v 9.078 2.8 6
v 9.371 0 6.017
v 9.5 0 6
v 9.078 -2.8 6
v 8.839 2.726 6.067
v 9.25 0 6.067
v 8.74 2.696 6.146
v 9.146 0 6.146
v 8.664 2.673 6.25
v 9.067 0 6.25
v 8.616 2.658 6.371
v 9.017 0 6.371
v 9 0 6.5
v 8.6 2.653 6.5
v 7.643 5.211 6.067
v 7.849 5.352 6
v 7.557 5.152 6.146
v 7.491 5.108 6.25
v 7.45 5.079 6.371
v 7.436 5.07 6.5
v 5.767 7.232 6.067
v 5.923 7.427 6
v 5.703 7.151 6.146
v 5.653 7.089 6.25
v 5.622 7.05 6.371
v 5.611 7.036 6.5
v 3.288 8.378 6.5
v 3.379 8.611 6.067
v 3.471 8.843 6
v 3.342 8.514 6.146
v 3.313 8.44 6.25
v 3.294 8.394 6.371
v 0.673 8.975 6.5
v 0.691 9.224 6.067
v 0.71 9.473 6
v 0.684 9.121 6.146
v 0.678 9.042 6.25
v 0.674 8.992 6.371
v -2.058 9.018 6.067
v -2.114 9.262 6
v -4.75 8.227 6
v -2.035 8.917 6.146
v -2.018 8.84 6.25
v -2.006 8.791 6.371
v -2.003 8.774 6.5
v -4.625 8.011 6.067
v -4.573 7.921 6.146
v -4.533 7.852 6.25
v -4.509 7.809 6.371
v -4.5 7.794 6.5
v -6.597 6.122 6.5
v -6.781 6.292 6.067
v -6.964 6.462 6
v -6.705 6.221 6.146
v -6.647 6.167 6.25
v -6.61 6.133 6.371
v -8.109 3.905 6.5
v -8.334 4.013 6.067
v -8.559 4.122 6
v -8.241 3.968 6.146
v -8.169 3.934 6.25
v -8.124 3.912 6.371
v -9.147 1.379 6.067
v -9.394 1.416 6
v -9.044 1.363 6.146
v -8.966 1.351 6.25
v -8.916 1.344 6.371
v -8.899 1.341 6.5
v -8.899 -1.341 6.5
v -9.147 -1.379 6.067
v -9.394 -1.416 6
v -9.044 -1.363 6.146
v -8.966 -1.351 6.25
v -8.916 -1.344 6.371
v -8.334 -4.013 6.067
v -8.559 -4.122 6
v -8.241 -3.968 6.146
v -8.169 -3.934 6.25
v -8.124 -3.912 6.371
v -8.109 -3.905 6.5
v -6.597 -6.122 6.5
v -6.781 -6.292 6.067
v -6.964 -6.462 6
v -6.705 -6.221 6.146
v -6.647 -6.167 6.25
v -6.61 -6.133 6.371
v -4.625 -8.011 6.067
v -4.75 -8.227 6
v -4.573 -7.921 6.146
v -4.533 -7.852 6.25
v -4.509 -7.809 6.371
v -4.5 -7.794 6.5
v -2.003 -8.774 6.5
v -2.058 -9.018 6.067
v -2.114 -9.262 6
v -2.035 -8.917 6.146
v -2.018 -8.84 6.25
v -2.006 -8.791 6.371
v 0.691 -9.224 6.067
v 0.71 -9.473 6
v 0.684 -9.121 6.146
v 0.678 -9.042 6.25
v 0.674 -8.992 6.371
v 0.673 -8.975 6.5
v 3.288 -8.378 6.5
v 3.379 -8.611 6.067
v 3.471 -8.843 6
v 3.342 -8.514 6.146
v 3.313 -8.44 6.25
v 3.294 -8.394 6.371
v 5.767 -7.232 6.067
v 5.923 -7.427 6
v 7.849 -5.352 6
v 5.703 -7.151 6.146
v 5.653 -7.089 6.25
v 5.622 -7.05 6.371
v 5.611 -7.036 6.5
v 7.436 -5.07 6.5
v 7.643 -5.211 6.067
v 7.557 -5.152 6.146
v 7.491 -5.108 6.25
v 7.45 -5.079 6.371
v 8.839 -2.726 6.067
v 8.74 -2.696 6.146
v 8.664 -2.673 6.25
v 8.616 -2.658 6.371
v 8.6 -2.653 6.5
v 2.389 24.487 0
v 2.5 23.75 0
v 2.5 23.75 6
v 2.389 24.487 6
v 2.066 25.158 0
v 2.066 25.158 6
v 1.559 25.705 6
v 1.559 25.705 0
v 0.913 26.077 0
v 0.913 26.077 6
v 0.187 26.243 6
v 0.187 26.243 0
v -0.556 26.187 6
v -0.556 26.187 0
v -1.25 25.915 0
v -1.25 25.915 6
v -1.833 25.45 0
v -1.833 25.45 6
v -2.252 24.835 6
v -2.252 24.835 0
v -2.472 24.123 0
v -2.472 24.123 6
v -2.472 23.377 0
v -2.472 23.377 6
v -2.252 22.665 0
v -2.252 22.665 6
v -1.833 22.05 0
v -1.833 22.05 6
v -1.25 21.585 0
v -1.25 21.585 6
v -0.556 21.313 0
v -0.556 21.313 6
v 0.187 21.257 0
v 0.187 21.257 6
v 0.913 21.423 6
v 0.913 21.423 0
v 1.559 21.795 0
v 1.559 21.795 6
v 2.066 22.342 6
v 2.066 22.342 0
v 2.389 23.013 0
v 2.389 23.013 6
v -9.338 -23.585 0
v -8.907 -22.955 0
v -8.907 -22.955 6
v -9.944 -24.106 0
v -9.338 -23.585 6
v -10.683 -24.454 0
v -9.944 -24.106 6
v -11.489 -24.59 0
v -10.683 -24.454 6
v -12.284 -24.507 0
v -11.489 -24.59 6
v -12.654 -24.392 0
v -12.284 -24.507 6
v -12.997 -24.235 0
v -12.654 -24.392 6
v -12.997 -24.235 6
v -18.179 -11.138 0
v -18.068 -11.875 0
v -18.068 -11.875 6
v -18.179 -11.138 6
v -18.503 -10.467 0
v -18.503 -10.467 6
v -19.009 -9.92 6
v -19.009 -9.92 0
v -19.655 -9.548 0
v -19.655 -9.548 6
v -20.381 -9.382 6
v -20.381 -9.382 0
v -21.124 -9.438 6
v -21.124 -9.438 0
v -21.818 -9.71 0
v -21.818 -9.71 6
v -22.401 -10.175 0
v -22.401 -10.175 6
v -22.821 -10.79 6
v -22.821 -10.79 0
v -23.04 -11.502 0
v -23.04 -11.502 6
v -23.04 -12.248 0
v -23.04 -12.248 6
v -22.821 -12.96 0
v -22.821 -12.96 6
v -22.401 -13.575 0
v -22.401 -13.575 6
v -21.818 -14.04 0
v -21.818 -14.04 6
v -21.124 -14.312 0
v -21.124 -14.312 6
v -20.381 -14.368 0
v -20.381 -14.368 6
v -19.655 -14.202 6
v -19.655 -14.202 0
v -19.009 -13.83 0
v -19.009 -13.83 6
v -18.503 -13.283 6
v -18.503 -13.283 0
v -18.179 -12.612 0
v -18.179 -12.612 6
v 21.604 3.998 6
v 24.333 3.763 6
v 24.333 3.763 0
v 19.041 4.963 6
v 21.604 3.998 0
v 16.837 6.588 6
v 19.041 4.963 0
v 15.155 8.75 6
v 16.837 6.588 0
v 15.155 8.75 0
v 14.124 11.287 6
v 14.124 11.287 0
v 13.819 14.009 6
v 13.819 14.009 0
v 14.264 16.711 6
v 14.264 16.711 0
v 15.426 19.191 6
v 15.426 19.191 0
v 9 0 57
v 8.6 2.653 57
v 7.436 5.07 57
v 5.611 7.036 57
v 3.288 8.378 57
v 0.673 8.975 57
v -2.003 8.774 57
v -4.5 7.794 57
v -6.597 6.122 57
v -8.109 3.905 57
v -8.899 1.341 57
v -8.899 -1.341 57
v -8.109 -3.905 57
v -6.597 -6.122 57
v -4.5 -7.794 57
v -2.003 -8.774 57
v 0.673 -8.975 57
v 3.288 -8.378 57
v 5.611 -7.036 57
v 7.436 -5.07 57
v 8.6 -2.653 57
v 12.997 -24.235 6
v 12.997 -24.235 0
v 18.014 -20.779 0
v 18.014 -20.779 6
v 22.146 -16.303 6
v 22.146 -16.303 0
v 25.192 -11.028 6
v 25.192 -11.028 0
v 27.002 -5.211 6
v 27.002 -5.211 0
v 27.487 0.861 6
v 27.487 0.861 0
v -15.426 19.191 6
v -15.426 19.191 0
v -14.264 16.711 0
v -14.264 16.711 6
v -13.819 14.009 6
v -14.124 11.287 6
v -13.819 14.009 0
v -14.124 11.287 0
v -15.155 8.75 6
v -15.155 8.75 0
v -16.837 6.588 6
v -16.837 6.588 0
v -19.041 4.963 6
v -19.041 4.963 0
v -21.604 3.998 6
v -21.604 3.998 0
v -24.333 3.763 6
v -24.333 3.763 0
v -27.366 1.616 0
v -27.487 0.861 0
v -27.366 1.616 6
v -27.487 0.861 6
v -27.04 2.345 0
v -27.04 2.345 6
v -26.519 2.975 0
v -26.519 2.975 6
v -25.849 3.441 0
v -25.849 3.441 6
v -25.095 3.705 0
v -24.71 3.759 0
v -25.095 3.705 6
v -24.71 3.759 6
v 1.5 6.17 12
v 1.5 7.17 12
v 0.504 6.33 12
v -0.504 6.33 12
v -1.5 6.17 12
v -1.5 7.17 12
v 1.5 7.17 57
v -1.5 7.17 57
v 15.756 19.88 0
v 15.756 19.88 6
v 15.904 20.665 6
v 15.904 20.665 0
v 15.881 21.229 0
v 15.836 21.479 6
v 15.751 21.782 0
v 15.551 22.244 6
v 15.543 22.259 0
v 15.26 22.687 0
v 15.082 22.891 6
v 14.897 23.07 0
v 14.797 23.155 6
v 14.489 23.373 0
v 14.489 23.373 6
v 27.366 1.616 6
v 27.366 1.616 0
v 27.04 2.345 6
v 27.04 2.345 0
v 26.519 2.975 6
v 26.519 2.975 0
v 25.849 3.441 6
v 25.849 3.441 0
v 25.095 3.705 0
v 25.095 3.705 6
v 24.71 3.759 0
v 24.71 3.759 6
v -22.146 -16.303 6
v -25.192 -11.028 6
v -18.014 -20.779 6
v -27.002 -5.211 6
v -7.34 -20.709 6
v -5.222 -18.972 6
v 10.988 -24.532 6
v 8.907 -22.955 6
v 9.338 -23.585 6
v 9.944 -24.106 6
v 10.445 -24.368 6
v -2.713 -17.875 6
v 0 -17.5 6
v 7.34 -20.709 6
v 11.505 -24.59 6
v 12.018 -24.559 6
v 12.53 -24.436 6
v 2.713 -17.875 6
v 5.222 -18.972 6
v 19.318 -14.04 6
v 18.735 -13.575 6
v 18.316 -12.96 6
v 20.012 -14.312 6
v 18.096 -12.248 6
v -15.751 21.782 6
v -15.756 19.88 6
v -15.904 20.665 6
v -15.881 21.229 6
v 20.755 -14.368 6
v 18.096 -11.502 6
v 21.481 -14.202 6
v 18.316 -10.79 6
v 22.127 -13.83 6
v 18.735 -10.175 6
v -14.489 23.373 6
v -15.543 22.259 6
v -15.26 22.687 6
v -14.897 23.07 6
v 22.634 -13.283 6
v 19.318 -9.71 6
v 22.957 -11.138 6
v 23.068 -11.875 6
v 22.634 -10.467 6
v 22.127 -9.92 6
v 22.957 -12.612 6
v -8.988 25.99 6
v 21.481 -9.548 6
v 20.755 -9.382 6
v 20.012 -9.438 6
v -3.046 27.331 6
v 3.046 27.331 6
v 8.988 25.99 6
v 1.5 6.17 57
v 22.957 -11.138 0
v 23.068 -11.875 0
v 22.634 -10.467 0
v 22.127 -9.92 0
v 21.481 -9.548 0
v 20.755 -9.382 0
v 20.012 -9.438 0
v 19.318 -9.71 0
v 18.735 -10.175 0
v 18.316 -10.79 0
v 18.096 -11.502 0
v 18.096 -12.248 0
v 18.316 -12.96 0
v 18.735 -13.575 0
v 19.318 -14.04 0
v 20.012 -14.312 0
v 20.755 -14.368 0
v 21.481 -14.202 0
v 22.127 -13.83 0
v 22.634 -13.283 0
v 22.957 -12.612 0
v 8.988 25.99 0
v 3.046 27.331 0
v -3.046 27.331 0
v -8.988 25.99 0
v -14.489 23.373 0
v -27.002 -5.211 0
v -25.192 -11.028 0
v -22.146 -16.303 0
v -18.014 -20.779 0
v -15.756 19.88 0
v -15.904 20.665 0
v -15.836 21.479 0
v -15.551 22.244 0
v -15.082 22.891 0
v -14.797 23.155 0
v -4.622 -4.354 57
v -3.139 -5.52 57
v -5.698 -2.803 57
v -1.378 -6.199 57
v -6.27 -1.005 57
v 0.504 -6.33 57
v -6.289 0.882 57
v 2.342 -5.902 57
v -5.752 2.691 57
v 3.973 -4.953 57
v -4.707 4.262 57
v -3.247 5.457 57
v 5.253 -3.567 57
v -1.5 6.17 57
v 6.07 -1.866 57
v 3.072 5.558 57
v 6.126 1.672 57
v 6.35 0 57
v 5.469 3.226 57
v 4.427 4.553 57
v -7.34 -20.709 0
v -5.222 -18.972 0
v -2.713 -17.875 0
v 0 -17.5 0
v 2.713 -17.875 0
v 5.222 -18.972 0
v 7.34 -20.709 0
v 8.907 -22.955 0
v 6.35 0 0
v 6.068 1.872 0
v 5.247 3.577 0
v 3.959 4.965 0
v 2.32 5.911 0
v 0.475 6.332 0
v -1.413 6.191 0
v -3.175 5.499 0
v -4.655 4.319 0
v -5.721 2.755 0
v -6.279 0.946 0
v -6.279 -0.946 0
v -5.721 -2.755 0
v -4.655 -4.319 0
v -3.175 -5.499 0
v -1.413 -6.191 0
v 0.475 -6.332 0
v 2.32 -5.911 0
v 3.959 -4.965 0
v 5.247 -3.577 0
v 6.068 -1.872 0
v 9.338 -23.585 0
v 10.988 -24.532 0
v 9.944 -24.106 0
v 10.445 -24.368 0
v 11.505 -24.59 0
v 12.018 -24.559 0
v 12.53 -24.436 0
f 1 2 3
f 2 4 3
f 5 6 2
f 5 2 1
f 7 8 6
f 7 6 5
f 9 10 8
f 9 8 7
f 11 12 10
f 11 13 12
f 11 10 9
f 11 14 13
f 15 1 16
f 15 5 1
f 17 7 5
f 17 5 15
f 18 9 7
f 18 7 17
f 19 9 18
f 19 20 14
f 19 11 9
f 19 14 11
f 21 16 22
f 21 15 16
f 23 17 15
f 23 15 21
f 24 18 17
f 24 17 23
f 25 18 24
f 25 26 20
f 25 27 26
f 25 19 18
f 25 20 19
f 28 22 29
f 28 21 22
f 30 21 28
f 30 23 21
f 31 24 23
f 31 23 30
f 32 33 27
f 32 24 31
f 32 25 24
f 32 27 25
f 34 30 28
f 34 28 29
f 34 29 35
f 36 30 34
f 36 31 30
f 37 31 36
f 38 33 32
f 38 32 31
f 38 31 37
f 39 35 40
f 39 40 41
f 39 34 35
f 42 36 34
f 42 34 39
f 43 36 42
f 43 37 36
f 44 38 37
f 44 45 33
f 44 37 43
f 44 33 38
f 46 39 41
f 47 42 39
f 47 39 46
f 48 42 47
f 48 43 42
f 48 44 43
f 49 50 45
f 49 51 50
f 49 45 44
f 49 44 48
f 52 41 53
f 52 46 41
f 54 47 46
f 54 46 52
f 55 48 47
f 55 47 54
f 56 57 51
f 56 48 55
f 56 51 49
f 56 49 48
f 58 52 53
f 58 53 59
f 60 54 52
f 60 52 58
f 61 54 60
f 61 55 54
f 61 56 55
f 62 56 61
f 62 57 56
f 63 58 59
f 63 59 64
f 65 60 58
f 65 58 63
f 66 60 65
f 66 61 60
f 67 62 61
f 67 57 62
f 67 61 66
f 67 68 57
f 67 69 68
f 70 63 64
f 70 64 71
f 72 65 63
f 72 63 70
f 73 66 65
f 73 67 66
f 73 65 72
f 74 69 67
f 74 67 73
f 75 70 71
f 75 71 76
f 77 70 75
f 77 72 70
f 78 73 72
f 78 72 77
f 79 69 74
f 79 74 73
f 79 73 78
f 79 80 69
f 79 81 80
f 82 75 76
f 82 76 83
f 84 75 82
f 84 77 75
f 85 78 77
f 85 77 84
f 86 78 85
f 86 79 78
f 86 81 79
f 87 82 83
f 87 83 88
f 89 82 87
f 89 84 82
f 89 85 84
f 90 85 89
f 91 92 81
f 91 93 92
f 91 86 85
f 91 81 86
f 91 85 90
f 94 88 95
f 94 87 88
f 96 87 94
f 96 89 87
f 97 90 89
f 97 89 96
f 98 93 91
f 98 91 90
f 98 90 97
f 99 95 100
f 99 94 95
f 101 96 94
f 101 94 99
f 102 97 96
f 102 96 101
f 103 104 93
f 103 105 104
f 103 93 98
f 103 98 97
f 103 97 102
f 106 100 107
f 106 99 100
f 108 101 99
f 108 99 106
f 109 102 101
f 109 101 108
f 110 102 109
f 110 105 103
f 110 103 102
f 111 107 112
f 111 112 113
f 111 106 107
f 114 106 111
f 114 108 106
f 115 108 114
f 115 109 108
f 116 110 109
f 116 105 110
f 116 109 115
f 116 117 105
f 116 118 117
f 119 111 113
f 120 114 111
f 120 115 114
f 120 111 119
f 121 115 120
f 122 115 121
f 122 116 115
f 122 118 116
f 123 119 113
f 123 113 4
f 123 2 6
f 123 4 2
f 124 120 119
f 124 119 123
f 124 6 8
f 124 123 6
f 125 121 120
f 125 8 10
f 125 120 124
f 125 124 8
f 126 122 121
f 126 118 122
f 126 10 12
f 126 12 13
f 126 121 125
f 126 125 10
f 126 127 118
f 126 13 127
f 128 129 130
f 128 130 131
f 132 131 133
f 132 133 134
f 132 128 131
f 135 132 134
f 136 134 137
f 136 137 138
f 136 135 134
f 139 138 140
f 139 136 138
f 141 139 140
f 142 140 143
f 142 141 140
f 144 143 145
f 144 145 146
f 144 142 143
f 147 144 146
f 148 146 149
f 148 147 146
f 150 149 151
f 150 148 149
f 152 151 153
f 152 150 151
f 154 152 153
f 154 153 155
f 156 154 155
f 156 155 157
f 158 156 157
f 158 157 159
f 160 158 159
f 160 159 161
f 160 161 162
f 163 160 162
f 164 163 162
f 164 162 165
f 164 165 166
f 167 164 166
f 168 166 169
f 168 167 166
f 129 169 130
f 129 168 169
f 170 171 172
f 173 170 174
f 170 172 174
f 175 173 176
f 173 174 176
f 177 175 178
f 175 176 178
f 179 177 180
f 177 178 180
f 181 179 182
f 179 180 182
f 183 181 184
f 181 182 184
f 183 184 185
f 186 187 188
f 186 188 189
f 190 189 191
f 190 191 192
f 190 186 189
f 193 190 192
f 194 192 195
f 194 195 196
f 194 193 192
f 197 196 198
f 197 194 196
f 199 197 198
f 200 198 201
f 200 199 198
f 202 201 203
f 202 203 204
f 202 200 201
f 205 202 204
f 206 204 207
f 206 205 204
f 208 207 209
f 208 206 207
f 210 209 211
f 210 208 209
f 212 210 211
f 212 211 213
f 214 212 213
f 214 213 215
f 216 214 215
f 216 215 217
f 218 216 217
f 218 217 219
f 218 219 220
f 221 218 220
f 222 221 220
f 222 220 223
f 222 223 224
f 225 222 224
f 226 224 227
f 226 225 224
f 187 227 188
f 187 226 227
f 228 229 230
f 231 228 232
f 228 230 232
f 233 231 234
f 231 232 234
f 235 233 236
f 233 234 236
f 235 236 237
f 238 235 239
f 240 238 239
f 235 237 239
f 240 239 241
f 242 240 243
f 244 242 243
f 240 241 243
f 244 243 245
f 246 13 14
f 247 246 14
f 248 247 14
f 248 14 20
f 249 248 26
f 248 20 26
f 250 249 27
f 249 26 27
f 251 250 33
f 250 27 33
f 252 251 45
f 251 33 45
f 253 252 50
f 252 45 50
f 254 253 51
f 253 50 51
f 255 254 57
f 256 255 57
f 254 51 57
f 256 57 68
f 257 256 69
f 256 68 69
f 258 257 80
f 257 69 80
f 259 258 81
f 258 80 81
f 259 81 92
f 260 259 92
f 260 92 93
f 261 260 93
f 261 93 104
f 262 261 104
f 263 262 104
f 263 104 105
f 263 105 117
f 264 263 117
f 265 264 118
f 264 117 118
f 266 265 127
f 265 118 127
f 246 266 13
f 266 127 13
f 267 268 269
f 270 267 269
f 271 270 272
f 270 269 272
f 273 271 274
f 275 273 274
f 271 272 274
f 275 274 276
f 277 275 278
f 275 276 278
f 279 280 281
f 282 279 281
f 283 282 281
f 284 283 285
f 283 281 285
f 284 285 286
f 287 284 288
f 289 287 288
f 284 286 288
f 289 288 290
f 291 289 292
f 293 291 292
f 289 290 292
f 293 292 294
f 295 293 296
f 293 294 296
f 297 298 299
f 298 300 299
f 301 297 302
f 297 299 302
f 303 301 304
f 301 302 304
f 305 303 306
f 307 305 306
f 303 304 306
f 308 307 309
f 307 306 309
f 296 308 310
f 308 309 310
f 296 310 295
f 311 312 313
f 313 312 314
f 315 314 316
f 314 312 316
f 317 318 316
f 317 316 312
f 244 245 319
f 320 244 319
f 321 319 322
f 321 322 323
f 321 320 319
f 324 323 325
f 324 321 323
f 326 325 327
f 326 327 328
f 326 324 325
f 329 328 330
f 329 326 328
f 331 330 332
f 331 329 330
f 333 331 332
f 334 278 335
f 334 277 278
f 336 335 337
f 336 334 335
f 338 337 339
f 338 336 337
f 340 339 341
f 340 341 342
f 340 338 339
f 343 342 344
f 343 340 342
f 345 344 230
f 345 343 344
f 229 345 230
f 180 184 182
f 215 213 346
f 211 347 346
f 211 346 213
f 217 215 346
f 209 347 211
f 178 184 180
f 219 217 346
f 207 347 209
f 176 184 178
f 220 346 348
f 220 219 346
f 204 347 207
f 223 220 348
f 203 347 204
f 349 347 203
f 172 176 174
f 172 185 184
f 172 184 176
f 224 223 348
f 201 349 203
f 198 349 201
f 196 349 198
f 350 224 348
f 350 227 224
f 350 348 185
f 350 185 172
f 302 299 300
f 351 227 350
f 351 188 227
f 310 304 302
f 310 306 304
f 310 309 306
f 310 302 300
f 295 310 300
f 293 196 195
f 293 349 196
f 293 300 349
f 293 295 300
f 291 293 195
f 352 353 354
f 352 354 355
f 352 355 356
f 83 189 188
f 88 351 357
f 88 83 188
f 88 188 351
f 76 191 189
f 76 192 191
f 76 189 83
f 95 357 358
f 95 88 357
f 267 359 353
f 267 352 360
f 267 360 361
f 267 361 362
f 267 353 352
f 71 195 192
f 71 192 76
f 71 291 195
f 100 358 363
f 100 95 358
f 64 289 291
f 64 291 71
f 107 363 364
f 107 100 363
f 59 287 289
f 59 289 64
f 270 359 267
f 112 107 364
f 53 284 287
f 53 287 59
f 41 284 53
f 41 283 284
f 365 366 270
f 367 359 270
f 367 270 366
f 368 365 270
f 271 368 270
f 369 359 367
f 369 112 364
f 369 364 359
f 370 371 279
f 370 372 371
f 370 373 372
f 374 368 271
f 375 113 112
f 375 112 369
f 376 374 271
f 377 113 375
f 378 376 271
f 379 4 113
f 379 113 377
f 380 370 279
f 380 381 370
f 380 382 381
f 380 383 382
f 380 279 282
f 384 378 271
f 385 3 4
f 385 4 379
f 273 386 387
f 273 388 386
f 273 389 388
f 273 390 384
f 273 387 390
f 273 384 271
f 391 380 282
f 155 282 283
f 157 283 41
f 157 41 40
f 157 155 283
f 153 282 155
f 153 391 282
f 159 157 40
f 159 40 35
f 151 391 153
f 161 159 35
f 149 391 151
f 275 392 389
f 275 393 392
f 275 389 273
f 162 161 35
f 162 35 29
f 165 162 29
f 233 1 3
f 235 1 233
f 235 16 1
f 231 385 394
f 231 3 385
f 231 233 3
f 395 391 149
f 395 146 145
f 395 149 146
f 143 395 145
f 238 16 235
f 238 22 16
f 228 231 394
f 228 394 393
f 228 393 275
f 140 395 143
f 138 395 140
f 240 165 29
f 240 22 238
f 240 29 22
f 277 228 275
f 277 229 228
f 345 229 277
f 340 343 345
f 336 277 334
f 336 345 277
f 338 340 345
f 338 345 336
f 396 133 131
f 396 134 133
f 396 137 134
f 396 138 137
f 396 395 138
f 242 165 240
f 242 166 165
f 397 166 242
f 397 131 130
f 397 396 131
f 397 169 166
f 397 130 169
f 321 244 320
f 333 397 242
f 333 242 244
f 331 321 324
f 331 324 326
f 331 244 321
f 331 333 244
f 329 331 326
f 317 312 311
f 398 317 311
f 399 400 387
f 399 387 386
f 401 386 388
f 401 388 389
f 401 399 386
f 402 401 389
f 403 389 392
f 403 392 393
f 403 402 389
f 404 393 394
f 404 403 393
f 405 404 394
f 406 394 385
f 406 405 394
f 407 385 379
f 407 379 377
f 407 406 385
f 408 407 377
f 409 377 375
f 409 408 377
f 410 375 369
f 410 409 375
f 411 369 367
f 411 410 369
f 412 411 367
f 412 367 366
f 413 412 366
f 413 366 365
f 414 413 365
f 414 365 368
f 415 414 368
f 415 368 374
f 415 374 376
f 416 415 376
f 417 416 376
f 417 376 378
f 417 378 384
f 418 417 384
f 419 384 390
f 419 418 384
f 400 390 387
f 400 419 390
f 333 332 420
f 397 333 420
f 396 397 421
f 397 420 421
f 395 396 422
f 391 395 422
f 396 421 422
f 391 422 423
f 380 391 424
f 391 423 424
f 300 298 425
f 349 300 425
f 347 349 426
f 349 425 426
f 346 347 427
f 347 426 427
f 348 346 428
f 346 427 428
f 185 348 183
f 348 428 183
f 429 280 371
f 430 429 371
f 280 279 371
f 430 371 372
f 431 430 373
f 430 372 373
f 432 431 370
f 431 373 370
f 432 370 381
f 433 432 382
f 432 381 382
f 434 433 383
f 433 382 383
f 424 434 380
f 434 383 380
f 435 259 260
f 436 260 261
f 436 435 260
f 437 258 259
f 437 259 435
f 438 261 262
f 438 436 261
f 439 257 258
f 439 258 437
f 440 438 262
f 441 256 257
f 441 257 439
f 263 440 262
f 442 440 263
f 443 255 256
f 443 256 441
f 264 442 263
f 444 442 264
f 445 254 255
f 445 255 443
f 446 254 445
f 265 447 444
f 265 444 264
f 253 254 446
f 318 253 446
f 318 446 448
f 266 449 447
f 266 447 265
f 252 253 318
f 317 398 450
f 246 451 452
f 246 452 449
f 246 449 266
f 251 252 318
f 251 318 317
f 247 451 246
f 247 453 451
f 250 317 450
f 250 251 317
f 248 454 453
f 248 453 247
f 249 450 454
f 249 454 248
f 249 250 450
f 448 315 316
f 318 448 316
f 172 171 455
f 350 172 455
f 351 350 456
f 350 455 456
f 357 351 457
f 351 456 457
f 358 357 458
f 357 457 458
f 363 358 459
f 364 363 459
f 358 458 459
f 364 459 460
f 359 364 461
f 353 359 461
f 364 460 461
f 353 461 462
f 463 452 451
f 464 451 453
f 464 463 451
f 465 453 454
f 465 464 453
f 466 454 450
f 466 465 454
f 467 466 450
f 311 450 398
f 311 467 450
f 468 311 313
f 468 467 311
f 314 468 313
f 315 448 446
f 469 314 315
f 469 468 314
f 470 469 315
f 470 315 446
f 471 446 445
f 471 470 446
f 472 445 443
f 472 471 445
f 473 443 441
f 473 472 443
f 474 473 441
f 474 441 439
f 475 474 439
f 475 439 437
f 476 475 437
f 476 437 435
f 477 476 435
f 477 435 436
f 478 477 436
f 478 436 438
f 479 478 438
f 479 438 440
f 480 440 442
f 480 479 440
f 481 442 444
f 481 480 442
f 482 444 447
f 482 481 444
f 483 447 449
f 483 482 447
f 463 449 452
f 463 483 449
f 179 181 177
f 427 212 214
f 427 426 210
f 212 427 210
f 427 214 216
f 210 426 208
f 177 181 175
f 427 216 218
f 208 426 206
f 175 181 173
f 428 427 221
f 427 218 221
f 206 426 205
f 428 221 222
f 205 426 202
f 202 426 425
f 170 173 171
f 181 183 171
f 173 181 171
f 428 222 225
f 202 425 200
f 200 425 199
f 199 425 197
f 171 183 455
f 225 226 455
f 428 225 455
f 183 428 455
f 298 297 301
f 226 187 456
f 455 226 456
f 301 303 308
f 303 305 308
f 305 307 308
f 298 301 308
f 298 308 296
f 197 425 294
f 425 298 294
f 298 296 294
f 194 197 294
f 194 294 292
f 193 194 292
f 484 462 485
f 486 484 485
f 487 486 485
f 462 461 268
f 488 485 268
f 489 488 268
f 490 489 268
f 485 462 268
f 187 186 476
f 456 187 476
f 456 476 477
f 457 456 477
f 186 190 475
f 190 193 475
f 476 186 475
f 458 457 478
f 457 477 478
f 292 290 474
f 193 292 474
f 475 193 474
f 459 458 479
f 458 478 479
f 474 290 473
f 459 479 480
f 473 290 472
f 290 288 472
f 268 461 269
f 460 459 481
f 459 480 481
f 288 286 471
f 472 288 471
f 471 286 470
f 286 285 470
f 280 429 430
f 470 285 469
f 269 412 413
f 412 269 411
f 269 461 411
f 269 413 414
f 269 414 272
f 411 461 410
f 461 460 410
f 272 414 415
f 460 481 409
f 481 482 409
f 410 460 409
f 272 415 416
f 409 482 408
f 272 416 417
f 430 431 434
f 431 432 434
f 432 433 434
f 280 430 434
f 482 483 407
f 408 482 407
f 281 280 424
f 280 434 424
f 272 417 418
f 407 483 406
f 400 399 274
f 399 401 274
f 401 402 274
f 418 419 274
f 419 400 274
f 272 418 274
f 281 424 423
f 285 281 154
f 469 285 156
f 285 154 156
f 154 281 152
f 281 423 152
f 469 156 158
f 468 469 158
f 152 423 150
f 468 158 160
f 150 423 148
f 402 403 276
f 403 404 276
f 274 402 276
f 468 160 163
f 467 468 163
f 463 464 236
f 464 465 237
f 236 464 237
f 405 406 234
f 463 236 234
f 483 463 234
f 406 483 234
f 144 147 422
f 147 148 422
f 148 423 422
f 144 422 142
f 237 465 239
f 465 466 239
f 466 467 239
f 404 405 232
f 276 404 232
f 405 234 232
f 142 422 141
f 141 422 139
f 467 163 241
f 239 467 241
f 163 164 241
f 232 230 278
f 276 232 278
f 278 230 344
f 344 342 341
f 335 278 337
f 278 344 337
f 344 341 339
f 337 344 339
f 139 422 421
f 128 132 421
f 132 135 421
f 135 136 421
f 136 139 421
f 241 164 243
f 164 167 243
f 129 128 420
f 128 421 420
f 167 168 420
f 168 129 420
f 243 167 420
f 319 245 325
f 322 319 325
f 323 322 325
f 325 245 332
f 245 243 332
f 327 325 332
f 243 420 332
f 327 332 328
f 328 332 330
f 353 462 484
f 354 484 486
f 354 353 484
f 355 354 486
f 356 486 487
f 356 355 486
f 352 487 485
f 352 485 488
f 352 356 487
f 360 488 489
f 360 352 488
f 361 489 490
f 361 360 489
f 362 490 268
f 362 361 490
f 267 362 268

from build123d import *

# Parameters (mm, degrees)
SKETCH1_R           = 2.5
SKETCH1_R_2         = 6.35
BOSS_EXTRUDE1_DEPTH = 6
SKETCH2_R           = 9
SKETCH2_R_2         = 6.35
BOSS_EXTRUDE2_DEPTH = 51
FILLET1_R           = 3
CUT_EXTRUDE1_START  = -45
CUT_EXTRUDE1_DEPTH  = 45
FILLET2_R           = 0.5


with BuildPart() as part:
    # Sketch1 → Boss-Extrude1 (new body)
    with BuildSketch(Plane.XY):
        with BuildLine():
            ThreePointArc((17.324446131, 21.356815452), (0, 27.5), (-17.324446131, 21.356815452))
            ThreePointArc((-17.324446131, 21.356815452), (-15.155444566, 8.75), (-27.157767791, 4.325002729))
            ThreePointArc((-27.157767791, 4.325002729), (-23.815698604, -13.75), (-9.83332166, -25.681818182))
            ThreePointArc((-9.83332166, -25.681818182), (0, -17.5), (9.83332166, -25.681818182))
            ThreePointArc((9.83332166, -25.681818182), (23.815698604, -13.75), (27.157767791, 4.325002729))
            ThreePointArc((27.157767791, 4.325002729), (15.155444566, 8.75), (17.324446131, 21.356815452))
        make_face()
        with Locations((0, 23.75)):
            Circle(SKETCH1_R, mode=Mode.SUBTRACT)
        with Locations((-20.56810334, -11.875)):
            Circle(SKETCH1_R, mode=Mode.SUBTRACT)
        with Locations((20.56810334, -11.875)):
            Circle(SKETCH1_R, mode=Mode.SUBTRACT)
        Circle(SKETCH1_R_2, mode=Mode.SUBTRACT)
    extrude(amount=BOSS_EXTRUDE1_DEPTH)

    # Sketch2 → Boss-Extrude2 (add)
    with BuildSketch(Plane.XY.offset(6)):
        Circle(SKETCH2_R)
        Circle(SKETCH2_R_2, mode=Mode.SUBTRACT)
    extrude(amount=BOSS_EXTRUDE2_DEPTH)

    # Fillet1
    fillet1_edges = [part.edges().sort_by_distance(p)[0] for p in [
        (27.157767791, 4.325002729, 3),
        (9.83332166, -25.681818182, 3),
        (-9.83332166, -25.681818182, 3),
        (-27.157767791, 4.325002729, 3),
        (-17.324446131, 21.356815452, 3),
        (17.324446131, 21.356815452, 3),
    ]]
    fillet(fillet1_edges, radius=FILLET1_R)

    # Sketch3 → Cut-Extrude1 (cut)
    with BuildSketch(Plane.XY.offset(57).offset(CUT_EXTRUDE1_START)):
        with BuildLine():
            Line((-1.5, 6.170291727), (-1.5, 7.170291727))
            Line((-1.5, 7.170291727), (1.5, 7.170291727))
            Line((1.5, 7.170291727), (1.5, 6.170291727))
            ThreePointArc((1.5, 6.170291727), (0, 6.35), (-1.5, 6.170291727))
        make_face()
    extrude(amount=CUT_EXTRUDE1_DEPTH, mode=Mode.SUBTRACT)

    # Fillet2
    fillet2_edges = [part.edges().sort_by_distance(p)[0] for p in [
        (-9, 0, 6),
    ]]
    fillet(fillet2_edges, radius=FILLET2_R)


solid = part.part
